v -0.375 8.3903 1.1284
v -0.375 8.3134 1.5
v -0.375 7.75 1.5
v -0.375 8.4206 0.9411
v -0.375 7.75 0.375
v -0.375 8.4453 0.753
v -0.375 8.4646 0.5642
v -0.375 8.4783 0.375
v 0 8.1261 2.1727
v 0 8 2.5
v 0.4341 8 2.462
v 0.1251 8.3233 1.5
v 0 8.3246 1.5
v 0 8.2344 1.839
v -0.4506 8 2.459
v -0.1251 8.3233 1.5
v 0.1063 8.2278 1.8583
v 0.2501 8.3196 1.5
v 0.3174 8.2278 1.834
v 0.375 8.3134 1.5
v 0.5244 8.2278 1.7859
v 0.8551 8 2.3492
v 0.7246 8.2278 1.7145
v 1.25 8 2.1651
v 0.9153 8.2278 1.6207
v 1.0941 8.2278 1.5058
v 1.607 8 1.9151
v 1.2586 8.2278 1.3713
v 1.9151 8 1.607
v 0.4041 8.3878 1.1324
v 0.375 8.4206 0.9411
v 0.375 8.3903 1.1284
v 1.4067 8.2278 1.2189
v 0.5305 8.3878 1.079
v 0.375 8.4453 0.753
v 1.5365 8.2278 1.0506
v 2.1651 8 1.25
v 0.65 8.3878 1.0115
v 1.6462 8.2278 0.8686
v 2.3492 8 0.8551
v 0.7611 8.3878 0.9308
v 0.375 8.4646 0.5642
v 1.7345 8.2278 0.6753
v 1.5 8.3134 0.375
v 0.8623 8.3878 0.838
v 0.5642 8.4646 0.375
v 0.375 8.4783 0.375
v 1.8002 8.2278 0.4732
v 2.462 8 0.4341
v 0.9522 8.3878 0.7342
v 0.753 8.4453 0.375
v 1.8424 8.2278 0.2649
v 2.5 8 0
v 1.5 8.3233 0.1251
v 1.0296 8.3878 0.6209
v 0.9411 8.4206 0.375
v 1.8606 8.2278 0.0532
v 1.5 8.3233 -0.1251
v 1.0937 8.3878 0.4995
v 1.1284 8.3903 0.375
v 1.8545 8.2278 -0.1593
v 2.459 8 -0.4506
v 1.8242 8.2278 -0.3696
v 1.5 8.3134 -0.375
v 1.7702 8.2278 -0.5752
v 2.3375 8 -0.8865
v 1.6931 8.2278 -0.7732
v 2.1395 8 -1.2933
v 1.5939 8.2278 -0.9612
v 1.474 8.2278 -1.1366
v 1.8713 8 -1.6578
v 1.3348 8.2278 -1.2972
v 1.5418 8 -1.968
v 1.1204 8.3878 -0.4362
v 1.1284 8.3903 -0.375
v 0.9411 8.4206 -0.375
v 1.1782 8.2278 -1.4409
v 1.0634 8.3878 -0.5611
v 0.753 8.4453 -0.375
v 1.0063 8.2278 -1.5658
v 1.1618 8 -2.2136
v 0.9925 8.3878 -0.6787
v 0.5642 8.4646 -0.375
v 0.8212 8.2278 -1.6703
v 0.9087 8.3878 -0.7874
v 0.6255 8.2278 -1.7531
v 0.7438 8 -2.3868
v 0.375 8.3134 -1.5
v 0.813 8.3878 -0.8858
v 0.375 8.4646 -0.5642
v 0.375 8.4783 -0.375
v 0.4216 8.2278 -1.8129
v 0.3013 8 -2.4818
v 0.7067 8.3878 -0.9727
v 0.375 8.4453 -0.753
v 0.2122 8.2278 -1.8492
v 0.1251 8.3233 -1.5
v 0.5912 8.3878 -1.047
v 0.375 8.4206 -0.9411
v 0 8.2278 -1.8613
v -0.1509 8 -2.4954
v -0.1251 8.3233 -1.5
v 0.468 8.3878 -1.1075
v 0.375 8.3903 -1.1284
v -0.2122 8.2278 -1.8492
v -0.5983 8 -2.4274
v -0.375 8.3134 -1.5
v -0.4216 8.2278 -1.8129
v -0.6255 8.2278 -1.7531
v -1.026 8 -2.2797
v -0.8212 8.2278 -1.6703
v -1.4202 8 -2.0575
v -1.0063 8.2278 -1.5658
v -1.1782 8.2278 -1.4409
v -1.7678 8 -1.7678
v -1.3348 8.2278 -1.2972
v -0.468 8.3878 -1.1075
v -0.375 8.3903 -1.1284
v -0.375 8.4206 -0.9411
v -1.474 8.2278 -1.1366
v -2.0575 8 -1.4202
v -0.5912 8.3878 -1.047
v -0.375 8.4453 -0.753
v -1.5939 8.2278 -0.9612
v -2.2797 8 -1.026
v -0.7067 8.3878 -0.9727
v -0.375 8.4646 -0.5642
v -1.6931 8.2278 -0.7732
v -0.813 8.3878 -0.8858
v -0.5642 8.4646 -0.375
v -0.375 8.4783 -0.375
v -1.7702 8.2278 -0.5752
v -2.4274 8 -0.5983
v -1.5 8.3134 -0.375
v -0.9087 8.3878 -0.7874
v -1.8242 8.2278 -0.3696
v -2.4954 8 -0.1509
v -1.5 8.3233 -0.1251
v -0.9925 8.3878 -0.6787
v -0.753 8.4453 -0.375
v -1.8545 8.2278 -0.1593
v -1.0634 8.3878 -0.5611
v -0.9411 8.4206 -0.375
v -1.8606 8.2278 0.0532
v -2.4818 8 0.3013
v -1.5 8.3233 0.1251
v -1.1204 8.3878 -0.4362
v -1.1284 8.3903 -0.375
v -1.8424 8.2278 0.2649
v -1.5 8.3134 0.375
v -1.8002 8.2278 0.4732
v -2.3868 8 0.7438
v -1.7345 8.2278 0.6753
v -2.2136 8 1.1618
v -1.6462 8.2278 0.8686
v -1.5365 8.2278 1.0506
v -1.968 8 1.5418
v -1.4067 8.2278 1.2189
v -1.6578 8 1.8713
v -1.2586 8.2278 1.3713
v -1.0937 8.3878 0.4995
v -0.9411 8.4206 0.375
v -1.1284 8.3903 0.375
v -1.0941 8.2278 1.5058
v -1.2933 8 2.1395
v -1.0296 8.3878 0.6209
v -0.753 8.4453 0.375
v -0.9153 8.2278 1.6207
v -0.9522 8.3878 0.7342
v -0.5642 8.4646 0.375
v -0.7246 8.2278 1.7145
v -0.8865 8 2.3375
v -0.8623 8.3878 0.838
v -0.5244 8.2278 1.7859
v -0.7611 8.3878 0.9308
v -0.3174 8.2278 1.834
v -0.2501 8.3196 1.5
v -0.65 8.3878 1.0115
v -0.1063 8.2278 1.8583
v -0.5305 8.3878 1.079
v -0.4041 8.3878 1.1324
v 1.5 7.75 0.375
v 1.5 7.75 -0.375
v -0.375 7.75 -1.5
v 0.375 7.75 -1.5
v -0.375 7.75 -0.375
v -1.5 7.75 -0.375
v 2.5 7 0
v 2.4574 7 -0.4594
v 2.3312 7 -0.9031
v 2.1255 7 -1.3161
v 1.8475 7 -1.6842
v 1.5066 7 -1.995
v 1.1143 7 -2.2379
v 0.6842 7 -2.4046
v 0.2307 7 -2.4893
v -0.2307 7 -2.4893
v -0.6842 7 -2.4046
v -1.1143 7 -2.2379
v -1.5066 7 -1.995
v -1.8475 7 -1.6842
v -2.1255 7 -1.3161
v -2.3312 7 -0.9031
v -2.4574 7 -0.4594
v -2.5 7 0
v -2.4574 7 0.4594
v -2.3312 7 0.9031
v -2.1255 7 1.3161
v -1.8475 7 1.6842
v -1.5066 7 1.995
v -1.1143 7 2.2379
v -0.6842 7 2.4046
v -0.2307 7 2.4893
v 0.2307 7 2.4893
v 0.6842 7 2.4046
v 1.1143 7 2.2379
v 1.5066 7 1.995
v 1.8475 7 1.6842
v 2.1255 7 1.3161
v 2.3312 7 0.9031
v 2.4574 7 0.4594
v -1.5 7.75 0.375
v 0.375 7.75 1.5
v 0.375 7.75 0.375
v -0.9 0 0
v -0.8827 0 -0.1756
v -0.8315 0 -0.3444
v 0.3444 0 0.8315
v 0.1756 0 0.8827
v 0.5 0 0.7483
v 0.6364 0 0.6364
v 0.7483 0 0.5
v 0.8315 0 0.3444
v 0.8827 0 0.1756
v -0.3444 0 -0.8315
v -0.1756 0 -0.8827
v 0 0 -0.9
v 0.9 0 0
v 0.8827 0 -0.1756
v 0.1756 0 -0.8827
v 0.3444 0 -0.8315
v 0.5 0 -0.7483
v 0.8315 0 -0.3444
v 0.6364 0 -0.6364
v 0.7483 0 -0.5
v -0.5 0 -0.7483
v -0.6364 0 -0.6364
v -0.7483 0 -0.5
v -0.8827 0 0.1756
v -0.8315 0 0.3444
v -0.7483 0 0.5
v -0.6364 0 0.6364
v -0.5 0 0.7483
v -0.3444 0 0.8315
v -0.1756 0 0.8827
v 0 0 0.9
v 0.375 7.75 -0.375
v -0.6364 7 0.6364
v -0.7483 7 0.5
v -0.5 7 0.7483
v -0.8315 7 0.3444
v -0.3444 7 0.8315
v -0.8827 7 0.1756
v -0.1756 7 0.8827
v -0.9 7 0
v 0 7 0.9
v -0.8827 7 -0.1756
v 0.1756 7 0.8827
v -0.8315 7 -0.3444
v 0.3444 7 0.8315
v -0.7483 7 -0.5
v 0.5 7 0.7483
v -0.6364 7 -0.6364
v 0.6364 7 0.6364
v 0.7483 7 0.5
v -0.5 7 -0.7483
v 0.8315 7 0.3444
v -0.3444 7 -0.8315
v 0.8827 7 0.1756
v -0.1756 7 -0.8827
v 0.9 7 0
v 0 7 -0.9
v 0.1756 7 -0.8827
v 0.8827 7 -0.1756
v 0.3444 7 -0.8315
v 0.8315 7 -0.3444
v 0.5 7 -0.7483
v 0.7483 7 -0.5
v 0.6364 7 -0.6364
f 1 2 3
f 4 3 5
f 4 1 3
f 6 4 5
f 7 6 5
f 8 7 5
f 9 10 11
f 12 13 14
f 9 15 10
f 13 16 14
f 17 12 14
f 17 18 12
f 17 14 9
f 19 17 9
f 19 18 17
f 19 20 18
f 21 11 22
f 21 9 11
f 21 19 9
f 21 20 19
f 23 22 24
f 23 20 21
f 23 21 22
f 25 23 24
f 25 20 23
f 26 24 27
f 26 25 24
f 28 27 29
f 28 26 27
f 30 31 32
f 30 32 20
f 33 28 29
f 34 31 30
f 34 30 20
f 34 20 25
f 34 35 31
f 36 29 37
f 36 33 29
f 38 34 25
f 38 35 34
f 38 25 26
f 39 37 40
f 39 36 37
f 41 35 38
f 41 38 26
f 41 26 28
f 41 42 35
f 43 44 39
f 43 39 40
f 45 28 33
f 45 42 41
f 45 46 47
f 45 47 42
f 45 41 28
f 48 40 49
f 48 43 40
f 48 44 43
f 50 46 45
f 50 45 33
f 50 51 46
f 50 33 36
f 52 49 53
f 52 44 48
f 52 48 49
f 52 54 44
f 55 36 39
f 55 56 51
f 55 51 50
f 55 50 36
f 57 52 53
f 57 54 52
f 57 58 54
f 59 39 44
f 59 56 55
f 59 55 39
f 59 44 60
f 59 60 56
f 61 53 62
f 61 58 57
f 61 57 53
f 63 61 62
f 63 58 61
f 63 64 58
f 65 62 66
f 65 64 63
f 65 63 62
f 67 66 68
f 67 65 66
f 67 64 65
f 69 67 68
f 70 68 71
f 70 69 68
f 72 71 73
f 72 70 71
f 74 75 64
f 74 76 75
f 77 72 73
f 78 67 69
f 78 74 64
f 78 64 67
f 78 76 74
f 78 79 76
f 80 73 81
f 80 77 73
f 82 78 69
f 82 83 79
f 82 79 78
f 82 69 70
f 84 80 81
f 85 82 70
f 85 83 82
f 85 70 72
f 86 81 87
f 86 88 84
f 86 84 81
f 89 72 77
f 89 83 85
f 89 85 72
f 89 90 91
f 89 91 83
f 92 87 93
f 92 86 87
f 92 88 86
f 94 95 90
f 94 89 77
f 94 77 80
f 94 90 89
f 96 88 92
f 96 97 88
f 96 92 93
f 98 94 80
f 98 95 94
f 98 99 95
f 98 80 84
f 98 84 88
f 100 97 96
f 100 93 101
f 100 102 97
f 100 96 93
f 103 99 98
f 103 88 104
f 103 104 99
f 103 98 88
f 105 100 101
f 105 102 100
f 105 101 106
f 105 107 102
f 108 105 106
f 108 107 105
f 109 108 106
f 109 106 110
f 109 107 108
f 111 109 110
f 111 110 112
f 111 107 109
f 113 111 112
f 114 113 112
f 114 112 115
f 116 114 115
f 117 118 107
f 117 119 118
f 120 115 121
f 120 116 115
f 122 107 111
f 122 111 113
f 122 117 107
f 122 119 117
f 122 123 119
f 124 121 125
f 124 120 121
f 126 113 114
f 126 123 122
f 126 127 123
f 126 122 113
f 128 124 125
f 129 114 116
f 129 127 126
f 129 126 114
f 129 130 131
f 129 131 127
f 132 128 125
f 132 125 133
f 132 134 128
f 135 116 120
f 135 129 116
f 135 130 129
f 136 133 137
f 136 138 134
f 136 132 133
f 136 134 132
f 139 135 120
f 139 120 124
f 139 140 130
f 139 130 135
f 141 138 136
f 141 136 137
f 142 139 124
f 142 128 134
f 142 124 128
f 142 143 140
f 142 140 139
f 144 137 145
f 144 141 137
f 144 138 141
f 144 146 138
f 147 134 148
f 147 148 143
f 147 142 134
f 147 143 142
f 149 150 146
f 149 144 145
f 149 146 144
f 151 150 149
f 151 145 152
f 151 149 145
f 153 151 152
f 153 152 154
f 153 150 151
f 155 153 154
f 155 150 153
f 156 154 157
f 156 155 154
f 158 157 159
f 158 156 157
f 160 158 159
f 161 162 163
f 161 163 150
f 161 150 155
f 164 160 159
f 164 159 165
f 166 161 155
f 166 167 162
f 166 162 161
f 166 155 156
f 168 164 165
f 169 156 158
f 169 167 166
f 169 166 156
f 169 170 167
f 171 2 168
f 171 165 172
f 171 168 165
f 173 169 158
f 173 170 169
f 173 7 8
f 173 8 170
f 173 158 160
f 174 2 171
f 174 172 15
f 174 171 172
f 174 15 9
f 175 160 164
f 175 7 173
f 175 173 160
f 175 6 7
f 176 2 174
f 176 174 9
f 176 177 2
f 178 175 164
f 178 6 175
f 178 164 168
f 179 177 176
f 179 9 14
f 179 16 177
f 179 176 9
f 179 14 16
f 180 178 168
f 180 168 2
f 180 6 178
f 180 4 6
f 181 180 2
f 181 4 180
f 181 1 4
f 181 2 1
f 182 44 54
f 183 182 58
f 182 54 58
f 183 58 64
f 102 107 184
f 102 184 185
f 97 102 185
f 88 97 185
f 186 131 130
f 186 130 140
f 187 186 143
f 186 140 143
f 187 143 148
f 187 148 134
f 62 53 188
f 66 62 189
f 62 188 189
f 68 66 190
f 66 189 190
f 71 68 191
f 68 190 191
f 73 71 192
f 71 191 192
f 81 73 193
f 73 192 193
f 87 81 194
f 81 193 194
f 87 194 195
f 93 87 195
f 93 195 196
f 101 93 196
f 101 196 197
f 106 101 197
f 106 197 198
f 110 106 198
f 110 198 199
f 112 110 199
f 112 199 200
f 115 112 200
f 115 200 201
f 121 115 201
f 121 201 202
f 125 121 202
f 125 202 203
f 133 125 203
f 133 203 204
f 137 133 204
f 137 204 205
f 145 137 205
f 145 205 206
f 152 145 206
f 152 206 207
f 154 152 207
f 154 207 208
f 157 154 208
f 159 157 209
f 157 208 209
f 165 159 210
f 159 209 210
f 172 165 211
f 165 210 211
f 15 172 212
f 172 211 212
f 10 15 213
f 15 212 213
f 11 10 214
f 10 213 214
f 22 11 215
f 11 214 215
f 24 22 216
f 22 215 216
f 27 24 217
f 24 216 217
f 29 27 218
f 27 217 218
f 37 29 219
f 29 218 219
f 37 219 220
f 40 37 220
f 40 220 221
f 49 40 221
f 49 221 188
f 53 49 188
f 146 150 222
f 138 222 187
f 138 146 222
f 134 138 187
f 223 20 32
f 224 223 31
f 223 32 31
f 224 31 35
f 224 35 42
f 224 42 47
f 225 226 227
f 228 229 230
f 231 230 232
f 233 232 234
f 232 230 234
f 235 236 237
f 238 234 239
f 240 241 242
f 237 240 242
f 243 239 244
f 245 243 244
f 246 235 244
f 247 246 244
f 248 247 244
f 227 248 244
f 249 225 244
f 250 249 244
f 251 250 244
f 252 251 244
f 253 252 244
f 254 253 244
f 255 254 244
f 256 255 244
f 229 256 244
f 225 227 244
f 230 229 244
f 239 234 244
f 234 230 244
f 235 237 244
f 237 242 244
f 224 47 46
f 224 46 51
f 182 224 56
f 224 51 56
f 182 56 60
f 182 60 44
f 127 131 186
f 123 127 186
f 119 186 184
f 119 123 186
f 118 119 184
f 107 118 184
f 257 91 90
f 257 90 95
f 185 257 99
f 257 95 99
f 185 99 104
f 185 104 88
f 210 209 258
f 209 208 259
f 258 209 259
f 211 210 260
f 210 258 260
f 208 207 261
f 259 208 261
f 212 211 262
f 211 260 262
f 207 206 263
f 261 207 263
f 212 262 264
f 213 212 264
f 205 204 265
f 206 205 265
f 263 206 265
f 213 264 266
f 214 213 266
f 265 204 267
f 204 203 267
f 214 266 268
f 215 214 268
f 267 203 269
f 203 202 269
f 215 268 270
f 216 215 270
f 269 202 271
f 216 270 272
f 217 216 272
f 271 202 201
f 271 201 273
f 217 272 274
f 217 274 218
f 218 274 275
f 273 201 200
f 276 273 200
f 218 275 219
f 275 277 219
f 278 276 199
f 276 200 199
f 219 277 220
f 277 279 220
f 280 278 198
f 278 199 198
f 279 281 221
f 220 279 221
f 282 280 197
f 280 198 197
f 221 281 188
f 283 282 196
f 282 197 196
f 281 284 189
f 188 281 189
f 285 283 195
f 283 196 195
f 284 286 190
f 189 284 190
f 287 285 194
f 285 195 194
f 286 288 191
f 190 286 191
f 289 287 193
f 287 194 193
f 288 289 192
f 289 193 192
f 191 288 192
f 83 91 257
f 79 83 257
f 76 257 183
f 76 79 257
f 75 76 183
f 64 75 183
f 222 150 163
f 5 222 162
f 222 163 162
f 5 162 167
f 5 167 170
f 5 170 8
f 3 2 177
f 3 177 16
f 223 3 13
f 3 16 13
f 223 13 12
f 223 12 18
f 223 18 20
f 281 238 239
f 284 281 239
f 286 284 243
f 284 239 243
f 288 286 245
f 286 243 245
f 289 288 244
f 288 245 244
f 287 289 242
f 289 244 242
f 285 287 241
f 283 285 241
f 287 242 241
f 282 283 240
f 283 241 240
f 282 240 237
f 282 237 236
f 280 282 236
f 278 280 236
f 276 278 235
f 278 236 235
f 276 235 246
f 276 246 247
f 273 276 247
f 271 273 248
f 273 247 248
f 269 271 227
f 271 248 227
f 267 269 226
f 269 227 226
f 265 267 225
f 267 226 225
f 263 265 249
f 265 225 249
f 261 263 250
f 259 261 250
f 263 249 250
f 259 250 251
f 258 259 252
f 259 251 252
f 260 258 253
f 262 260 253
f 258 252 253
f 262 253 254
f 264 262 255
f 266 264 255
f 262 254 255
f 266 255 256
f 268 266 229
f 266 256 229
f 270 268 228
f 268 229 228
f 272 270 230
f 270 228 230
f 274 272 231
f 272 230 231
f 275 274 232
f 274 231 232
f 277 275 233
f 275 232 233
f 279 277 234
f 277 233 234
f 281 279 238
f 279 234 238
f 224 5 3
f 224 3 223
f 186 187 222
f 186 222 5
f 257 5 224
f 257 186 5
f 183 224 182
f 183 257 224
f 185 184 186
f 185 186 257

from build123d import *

# Parameters (mm, degrees)
SKETCH1_R           = 0.9
BOSS_EXTRUDE1_DEPTH = 7
SKETCH2_R           = 2.5
BOSS_EXTRUDE2_DEPTH = 1
DOME1_FACE_RADIUS   = 2.5
DOME1_HEIGHT        = 0.5
SKETCH3_W           = 1.125
SKETCH3_H           = 0.75
SKETCH3_W_2         = 0.75
SKETCH3_H_2         = 1.125
CUT_EXTRUDE1_DEPTH  = 0.75


with BuildPart() as part:
    # Sketch1 → Boss-Extrude1 (new body)
    with BuildSketch(Plane(origin=(0, 0, 0), x_dir=(1, 0, 0), z_dir=(0, 1, 0))):
        Circle(SKETCH1_R)
    extrude(amount=BOSS_EXTRUDE1_DEPTH)

    # Sketch2 → Boss-Extrude2 (add)
    with BuildSketch(Plane(origin=(0, 7, 0), x_dir=(1, 0, 0), z_dir=(0, 1, 0))):
        Circle(SKETCH2_R)
    extrude(amount=BOSS_EXTRUDE2_DEPTH)

    # Dome1: a dome of height H over a round flat face of radius A is a cap of a sphere of radius (A * A + H * H) / (2 * H)
    dome1_r = (DOME1_FACE_RADIUS * DOME1_FACE_RADIUS + DOME1_HEIGHT * DOME1_HEIGHT) / (2 * DOME1_HEIGHT)
    dome1_base = Plane((0, 8, 0), z_dir=(0, 1, 0))
    with Locations(dome1_base.offset(DOME1_HEIGHT - dome1_r)):
        dome1_ball = Sphere(dome1_r, mode=Mode.PRIVATE)
    add(split(dome1_ball, bisect_by=dome1_base, keep=Keep.TOP, mode=Mode.PRIVATE))

    # Sketch3 → Cut-Extrude1 (cut)
    with BuildSketch(Plane(origin=(0, 8.5, 0), x_dir=(1, 0, 0), z_dir=(0, 1, 0))):
        with Locations((-0.9375, 0)):
            Rectangle(SKETCH3_W, SKETCH3_H)
        Rectangle(SKETCH3_W_2, SKETCH3_H)
        with Locations((0, 0.9375)):
            Rectangle(SKETCH3_W_2, SKETCH3_H_2)
        with Locations((0.9375, 0)):
            Rectangle(SKETCH3_W, SKETCH3_H)
        with Locations((0, -0.9375)):
            Rectangle(SKETCH3_W_2, SKETCH3_H_2)
    extrude(amount=-CUT_EXTRUDE1_DEPTH, mode=Mode.SUBTRACT)


solid = part.part
